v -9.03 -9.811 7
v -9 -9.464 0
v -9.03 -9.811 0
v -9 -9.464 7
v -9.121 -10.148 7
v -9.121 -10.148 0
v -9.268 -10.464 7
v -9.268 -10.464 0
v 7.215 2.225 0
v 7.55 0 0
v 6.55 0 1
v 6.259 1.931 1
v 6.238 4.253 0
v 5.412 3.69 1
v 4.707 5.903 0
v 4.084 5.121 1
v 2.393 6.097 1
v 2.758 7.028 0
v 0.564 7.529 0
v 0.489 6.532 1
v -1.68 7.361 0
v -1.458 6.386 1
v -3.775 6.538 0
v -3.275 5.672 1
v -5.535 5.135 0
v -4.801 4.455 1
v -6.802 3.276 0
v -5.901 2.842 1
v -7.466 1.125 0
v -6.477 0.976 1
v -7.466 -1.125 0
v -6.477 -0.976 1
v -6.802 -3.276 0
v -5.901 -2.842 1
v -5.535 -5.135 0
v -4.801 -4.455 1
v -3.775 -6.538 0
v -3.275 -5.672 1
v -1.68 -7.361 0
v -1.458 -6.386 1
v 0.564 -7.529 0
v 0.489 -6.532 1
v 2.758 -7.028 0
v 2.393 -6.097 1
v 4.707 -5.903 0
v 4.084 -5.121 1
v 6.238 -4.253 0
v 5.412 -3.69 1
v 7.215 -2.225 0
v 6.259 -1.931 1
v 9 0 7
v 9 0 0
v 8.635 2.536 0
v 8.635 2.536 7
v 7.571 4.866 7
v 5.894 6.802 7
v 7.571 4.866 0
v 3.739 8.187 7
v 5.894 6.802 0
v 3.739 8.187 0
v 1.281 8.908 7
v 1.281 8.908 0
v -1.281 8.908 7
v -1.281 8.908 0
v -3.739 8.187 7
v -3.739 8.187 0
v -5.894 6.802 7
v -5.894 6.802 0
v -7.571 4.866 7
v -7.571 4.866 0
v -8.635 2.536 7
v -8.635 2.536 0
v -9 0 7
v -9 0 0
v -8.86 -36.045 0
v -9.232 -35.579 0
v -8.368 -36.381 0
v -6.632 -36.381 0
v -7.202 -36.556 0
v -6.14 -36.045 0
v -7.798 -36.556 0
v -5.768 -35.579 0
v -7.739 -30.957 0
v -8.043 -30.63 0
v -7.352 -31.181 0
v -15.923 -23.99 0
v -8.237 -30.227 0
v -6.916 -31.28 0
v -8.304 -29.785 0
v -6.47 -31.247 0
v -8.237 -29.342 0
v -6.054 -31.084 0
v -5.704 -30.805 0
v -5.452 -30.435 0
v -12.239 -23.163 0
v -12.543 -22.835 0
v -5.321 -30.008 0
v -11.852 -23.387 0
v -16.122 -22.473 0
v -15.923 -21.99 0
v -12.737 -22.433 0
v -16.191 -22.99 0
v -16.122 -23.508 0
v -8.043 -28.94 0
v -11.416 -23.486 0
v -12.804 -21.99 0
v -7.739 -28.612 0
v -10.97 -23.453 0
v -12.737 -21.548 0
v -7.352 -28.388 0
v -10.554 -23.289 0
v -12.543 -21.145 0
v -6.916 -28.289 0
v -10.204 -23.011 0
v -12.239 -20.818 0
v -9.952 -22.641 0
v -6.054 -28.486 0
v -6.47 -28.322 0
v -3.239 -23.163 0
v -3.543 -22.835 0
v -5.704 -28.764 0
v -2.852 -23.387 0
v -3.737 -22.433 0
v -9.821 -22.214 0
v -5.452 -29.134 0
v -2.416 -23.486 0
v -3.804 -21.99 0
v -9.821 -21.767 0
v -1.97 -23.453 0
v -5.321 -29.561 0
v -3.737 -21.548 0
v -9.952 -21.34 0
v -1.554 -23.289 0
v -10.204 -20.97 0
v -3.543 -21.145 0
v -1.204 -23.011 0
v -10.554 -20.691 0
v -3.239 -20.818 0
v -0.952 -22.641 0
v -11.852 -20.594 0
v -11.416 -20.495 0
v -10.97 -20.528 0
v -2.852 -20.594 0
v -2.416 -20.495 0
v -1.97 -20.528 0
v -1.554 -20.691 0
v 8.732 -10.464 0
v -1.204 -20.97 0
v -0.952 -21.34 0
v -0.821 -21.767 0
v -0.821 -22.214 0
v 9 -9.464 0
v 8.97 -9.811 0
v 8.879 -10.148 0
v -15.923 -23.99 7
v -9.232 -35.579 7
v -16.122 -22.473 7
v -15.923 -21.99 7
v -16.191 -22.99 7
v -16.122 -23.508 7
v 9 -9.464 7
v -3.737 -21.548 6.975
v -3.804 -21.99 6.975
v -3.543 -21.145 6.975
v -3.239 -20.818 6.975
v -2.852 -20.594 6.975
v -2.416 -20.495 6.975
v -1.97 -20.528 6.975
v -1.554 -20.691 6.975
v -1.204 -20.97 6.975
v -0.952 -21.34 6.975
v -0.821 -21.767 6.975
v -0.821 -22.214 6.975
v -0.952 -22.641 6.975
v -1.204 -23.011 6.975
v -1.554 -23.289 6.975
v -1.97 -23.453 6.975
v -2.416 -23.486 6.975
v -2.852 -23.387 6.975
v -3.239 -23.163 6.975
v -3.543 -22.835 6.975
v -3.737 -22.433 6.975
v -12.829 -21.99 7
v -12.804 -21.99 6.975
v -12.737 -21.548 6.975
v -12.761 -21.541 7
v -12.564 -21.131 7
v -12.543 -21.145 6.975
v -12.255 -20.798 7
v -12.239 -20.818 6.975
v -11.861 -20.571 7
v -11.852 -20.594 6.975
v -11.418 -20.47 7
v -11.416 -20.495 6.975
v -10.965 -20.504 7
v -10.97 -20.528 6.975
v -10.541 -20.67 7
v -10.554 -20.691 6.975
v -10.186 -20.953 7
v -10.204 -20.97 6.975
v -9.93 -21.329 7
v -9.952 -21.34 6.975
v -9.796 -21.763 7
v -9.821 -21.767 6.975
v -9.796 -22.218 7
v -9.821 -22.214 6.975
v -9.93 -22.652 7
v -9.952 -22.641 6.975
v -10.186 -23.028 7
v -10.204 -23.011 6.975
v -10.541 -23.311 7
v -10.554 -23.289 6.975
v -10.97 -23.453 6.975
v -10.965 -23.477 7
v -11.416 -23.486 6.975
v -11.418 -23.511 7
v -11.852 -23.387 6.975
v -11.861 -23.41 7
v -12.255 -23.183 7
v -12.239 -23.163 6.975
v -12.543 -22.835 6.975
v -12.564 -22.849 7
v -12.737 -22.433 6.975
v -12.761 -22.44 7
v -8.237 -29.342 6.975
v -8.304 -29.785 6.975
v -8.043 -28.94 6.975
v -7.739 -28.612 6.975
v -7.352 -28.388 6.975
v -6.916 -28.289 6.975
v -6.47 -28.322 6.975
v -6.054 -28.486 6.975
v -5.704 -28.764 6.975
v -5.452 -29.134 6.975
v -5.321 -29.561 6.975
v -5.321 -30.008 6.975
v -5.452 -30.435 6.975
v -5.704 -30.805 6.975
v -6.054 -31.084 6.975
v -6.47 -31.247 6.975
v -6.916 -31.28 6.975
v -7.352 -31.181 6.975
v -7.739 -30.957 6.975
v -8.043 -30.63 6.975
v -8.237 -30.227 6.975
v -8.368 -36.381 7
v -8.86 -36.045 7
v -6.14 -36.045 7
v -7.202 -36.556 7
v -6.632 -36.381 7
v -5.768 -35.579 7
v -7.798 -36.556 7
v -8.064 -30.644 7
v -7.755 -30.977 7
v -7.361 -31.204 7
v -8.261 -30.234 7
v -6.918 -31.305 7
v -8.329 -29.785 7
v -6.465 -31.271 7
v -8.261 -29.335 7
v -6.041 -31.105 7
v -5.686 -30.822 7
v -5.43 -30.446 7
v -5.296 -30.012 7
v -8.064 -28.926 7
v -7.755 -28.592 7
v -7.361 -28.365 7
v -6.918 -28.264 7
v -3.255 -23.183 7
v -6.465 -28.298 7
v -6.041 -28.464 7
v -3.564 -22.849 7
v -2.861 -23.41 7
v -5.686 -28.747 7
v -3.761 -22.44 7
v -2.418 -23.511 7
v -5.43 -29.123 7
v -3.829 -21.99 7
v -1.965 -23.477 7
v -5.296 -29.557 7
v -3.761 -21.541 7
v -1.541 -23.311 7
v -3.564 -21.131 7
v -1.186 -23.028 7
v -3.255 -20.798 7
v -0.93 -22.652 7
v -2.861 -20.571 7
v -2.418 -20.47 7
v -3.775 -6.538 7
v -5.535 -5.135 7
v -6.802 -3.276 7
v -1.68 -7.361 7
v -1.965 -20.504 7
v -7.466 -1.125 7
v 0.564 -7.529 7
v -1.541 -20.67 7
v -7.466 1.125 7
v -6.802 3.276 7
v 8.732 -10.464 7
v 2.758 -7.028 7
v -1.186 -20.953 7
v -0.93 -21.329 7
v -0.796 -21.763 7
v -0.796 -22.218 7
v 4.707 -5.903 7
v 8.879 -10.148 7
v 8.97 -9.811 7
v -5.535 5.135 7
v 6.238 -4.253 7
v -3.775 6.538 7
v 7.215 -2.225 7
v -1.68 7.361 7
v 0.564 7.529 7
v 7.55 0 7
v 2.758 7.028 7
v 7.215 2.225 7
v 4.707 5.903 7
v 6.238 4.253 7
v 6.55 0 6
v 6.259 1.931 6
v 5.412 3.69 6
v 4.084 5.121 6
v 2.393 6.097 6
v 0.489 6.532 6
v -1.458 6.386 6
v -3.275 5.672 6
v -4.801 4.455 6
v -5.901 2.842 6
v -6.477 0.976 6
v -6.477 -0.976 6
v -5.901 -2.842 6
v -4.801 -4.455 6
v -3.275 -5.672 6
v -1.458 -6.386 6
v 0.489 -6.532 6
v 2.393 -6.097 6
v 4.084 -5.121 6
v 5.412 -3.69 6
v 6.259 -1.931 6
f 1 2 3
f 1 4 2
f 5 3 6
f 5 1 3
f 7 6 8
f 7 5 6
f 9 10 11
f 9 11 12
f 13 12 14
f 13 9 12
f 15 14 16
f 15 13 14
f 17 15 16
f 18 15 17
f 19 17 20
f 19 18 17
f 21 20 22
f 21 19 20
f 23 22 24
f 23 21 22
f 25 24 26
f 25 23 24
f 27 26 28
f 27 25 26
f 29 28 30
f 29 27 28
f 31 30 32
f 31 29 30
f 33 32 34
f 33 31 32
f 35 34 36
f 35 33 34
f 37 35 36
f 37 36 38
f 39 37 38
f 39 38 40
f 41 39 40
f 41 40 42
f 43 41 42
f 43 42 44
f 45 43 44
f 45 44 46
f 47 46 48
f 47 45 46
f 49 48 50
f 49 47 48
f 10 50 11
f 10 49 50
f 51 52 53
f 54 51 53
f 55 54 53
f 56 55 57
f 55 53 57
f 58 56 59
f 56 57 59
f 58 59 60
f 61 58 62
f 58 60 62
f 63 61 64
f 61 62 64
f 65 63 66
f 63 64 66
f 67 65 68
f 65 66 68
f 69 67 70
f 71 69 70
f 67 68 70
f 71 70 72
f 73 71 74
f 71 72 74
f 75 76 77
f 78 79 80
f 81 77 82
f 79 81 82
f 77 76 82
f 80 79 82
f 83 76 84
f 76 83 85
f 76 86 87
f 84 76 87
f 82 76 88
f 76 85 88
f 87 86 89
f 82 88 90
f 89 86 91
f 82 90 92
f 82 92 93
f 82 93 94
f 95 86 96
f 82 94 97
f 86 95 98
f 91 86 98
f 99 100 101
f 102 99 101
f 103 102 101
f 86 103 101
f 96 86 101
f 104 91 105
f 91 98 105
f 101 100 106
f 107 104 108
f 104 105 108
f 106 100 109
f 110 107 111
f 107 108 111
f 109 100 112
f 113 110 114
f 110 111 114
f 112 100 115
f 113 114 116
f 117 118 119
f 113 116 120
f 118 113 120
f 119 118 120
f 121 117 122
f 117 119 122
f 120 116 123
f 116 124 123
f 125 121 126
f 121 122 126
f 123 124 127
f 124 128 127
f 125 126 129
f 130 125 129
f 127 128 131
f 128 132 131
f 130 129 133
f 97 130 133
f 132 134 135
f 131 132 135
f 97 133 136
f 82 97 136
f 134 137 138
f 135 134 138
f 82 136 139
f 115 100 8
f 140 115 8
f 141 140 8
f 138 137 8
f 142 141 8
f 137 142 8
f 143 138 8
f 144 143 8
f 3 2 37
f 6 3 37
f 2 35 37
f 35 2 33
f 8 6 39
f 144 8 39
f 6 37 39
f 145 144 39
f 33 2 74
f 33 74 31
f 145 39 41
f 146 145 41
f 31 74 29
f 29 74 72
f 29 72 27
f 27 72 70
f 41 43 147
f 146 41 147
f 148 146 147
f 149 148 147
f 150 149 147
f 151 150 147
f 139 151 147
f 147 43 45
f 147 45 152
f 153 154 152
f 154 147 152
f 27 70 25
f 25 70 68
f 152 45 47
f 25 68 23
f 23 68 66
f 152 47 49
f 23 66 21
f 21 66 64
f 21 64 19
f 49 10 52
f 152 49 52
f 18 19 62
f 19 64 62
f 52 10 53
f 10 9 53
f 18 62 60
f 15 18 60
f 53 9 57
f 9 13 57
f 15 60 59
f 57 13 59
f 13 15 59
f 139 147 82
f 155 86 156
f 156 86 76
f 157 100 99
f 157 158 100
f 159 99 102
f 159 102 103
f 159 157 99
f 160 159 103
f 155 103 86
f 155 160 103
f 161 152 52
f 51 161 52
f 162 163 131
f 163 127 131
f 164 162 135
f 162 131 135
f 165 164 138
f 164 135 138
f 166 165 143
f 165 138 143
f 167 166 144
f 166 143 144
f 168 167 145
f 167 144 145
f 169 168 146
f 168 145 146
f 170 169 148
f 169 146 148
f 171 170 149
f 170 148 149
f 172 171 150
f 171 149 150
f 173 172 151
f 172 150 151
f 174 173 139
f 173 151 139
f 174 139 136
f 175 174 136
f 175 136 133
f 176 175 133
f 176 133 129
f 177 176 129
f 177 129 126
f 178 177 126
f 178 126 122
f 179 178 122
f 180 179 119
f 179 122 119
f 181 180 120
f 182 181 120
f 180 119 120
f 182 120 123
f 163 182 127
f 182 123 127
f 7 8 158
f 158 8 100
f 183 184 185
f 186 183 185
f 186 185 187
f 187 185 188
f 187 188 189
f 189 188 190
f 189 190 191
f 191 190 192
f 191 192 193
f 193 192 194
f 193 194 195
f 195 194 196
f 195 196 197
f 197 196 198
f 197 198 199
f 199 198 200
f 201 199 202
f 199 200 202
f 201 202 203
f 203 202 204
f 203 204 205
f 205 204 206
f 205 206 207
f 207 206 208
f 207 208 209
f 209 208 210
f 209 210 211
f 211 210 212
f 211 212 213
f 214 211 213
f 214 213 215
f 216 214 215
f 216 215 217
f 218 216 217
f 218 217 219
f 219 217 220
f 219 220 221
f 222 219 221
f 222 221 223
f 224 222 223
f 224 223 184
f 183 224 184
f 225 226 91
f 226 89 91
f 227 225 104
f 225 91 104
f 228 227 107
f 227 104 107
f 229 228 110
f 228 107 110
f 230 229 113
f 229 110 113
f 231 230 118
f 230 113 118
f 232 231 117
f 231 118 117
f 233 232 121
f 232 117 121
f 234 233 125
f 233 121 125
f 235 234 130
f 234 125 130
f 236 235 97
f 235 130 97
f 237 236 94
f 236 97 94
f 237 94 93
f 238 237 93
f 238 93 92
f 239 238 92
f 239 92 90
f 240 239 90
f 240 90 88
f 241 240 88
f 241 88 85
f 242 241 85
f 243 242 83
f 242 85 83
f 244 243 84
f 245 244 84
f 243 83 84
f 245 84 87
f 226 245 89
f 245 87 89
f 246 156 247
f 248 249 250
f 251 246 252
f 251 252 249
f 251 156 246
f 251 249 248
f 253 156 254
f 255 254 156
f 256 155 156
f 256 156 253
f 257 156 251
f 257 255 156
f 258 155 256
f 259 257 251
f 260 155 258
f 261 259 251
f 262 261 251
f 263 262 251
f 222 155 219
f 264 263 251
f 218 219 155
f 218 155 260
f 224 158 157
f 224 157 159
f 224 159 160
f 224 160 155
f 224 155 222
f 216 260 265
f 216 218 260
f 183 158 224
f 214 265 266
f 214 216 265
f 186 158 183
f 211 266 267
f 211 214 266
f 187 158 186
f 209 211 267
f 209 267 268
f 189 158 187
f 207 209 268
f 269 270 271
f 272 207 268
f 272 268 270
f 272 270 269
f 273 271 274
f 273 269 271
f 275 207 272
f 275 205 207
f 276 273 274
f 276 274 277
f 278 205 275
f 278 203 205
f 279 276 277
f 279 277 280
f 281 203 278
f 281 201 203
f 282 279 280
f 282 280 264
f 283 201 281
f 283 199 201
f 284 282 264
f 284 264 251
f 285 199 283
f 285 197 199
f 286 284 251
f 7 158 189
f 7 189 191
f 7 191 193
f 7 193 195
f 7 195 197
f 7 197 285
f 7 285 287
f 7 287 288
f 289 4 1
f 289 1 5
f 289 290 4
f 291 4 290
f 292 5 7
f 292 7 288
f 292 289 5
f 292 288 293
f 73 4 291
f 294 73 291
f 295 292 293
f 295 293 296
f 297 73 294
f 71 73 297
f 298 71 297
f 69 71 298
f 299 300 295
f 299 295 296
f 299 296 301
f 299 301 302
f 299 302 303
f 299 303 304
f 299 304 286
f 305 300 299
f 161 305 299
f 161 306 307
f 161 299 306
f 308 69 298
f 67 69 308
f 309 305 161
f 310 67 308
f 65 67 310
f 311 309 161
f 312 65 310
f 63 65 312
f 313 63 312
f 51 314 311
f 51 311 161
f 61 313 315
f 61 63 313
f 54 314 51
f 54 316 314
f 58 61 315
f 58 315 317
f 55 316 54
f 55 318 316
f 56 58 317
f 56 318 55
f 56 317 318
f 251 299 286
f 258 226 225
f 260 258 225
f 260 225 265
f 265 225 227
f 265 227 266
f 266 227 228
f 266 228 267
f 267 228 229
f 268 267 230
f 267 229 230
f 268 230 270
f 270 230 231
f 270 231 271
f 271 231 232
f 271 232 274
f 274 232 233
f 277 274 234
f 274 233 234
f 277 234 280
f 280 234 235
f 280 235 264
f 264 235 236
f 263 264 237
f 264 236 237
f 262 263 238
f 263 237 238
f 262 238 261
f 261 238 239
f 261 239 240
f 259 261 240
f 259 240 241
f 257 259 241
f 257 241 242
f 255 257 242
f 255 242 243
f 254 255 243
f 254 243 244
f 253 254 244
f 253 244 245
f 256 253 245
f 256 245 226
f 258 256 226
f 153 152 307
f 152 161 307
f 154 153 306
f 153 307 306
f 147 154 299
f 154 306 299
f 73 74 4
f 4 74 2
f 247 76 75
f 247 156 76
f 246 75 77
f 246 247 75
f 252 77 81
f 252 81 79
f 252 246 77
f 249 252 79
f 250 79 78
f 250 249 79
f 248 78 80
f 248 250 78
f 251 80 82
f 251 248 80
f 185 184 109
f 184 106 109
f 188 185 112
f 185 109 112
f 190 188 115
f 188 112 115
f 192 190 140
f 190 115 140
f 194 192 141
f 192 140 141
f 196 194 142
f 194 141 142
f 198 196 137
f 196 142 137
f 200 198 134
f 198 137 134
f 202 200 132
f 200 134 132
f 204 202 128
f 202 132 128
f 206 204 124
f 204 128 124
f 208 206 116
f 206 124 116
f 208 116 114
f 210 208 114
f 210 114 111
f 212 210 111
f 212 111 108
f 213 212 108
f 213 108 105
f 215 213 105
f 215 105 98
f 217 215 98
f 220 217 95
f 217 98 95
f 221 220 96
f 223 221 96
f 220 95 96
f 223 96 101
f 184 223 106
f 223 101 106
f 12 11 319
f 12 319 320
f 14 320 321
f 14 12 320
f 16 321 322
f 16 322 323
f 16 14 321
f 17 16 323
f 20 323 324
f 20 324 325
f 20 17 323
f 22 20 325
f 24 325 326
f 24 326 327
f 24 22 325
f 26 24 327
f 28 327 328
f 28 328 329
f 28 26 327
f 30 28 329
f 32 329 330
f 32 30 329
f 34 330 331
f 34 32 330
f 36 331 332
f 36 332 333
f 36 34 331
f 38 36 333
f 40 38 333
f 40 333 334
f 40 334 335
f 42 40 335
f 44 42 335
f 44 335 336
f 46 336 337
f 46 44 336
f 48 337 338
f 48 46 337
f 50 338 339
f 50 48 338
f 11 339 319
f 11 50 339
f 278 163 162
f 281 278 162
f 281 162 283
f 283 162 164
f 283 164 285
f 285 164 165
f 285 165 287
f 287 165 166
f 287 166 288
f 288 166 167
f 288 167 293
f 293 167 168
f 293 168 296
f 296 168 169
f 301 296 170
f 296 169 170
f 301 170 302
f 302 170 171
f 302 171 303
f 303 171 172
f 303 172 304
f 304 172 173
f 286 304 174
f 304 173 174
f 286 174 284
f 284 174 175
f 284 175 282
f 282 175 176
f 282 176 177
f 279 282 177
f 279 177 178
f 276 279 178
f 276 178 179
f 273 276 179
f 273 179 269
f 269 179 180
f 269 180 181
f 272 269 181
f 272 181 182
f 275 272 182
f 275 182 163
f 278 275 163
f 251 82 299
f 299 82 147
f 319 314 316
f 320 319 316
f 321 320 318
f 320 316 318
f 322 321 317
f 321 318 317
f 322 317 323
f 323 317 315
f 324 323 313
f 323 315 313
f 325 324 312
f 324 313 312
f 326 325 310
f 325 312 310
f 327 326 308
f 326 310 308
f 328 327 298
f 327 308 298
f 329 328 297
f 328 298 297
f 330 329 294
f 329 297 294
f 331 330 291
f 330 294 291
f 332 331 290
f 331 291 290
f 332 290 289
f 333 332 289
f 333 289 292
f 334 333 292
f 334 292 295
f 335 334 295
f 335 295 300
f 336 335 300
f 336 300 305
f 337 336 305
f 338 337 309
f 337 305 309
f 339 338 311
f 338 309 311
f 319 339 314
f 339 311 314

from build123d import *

# Parameters (mm, degrees)
SKETCH1_R                       = 6.55
BOSS_EXTRUDE1_DEPTH             = 7
CHAMFER1_SIZE                   = 1
FILLET1_R                       = 2
F_3_0MM_DOWEL_HOLE1_D           = 3
F_3_0MM_DOWEL_HOLE1_CSINK_D     = 3.05
F_3_0MM_DOWEL_HOLE1_CSINK_ANGLE = 90


with BuildPart() as part:
    # Sketch1 → Boss-Extrude1 (new body)
    with BuildSketch(Plane.XY):
        with BuildLine():
            Line((-9, 0), (-9, -10))
            Line((-9, -10), (-16.5, -22.990381057))
            Line((-16.5, -22.990381057), (-7.5, -38.578838325))
            Line((-7.5, -38.578838325), (9, -10))
            Line((9, -10), (9, 0))
            ThreePointArc((9, 0), (0, 9), (-9, 0))
        make_face()
        Circle(SKETCH1_R, mode=Mode.SUBTRACT)
    extrude(amount=BOSS_EXTRUDE1_DEPTH)

    # Chamfer1
    chamfer1_edges = [part.edges().sort_by_distance(p)[0] for p in [
        (-6.55, 0, 0),
        (-6.55, 0, 7),
    ]]
    chamfer(chamfer1_edges, length=CHAMFER1_SIZE)

    # Fillet1
    fillet1_edges = [part.edges().sort_by_distance(p)[0] for p in [
        (9, -10, 3.5),
        (-7.5, -38.578838325, 3.5),
        (-16.5, -22.990381057, 3.5),
        (-9, -10, 3.5),
    ]]
    fillet(fillet1_edges, radius=FILLET1_R)

    # Ø3.0mm Dowel Hole1 (through all)
    with Locations(Plane.XY.offset(7)):
        with Locations((-11.303847577, -21.990381057), (-6.803847577, -29.784609691), (-2.303847577, -21.990381057)):
            CounterSinkHole(F_3_0MM_DOWEL_HOLE1_D / 2, F_3_0MM_DOWEL_HOLE1_CSINK_D / 2, counter_sink_angle=F_3_0MM_DOWEL_HOLE1_CSINK_ANGLE)


solid = part.part
